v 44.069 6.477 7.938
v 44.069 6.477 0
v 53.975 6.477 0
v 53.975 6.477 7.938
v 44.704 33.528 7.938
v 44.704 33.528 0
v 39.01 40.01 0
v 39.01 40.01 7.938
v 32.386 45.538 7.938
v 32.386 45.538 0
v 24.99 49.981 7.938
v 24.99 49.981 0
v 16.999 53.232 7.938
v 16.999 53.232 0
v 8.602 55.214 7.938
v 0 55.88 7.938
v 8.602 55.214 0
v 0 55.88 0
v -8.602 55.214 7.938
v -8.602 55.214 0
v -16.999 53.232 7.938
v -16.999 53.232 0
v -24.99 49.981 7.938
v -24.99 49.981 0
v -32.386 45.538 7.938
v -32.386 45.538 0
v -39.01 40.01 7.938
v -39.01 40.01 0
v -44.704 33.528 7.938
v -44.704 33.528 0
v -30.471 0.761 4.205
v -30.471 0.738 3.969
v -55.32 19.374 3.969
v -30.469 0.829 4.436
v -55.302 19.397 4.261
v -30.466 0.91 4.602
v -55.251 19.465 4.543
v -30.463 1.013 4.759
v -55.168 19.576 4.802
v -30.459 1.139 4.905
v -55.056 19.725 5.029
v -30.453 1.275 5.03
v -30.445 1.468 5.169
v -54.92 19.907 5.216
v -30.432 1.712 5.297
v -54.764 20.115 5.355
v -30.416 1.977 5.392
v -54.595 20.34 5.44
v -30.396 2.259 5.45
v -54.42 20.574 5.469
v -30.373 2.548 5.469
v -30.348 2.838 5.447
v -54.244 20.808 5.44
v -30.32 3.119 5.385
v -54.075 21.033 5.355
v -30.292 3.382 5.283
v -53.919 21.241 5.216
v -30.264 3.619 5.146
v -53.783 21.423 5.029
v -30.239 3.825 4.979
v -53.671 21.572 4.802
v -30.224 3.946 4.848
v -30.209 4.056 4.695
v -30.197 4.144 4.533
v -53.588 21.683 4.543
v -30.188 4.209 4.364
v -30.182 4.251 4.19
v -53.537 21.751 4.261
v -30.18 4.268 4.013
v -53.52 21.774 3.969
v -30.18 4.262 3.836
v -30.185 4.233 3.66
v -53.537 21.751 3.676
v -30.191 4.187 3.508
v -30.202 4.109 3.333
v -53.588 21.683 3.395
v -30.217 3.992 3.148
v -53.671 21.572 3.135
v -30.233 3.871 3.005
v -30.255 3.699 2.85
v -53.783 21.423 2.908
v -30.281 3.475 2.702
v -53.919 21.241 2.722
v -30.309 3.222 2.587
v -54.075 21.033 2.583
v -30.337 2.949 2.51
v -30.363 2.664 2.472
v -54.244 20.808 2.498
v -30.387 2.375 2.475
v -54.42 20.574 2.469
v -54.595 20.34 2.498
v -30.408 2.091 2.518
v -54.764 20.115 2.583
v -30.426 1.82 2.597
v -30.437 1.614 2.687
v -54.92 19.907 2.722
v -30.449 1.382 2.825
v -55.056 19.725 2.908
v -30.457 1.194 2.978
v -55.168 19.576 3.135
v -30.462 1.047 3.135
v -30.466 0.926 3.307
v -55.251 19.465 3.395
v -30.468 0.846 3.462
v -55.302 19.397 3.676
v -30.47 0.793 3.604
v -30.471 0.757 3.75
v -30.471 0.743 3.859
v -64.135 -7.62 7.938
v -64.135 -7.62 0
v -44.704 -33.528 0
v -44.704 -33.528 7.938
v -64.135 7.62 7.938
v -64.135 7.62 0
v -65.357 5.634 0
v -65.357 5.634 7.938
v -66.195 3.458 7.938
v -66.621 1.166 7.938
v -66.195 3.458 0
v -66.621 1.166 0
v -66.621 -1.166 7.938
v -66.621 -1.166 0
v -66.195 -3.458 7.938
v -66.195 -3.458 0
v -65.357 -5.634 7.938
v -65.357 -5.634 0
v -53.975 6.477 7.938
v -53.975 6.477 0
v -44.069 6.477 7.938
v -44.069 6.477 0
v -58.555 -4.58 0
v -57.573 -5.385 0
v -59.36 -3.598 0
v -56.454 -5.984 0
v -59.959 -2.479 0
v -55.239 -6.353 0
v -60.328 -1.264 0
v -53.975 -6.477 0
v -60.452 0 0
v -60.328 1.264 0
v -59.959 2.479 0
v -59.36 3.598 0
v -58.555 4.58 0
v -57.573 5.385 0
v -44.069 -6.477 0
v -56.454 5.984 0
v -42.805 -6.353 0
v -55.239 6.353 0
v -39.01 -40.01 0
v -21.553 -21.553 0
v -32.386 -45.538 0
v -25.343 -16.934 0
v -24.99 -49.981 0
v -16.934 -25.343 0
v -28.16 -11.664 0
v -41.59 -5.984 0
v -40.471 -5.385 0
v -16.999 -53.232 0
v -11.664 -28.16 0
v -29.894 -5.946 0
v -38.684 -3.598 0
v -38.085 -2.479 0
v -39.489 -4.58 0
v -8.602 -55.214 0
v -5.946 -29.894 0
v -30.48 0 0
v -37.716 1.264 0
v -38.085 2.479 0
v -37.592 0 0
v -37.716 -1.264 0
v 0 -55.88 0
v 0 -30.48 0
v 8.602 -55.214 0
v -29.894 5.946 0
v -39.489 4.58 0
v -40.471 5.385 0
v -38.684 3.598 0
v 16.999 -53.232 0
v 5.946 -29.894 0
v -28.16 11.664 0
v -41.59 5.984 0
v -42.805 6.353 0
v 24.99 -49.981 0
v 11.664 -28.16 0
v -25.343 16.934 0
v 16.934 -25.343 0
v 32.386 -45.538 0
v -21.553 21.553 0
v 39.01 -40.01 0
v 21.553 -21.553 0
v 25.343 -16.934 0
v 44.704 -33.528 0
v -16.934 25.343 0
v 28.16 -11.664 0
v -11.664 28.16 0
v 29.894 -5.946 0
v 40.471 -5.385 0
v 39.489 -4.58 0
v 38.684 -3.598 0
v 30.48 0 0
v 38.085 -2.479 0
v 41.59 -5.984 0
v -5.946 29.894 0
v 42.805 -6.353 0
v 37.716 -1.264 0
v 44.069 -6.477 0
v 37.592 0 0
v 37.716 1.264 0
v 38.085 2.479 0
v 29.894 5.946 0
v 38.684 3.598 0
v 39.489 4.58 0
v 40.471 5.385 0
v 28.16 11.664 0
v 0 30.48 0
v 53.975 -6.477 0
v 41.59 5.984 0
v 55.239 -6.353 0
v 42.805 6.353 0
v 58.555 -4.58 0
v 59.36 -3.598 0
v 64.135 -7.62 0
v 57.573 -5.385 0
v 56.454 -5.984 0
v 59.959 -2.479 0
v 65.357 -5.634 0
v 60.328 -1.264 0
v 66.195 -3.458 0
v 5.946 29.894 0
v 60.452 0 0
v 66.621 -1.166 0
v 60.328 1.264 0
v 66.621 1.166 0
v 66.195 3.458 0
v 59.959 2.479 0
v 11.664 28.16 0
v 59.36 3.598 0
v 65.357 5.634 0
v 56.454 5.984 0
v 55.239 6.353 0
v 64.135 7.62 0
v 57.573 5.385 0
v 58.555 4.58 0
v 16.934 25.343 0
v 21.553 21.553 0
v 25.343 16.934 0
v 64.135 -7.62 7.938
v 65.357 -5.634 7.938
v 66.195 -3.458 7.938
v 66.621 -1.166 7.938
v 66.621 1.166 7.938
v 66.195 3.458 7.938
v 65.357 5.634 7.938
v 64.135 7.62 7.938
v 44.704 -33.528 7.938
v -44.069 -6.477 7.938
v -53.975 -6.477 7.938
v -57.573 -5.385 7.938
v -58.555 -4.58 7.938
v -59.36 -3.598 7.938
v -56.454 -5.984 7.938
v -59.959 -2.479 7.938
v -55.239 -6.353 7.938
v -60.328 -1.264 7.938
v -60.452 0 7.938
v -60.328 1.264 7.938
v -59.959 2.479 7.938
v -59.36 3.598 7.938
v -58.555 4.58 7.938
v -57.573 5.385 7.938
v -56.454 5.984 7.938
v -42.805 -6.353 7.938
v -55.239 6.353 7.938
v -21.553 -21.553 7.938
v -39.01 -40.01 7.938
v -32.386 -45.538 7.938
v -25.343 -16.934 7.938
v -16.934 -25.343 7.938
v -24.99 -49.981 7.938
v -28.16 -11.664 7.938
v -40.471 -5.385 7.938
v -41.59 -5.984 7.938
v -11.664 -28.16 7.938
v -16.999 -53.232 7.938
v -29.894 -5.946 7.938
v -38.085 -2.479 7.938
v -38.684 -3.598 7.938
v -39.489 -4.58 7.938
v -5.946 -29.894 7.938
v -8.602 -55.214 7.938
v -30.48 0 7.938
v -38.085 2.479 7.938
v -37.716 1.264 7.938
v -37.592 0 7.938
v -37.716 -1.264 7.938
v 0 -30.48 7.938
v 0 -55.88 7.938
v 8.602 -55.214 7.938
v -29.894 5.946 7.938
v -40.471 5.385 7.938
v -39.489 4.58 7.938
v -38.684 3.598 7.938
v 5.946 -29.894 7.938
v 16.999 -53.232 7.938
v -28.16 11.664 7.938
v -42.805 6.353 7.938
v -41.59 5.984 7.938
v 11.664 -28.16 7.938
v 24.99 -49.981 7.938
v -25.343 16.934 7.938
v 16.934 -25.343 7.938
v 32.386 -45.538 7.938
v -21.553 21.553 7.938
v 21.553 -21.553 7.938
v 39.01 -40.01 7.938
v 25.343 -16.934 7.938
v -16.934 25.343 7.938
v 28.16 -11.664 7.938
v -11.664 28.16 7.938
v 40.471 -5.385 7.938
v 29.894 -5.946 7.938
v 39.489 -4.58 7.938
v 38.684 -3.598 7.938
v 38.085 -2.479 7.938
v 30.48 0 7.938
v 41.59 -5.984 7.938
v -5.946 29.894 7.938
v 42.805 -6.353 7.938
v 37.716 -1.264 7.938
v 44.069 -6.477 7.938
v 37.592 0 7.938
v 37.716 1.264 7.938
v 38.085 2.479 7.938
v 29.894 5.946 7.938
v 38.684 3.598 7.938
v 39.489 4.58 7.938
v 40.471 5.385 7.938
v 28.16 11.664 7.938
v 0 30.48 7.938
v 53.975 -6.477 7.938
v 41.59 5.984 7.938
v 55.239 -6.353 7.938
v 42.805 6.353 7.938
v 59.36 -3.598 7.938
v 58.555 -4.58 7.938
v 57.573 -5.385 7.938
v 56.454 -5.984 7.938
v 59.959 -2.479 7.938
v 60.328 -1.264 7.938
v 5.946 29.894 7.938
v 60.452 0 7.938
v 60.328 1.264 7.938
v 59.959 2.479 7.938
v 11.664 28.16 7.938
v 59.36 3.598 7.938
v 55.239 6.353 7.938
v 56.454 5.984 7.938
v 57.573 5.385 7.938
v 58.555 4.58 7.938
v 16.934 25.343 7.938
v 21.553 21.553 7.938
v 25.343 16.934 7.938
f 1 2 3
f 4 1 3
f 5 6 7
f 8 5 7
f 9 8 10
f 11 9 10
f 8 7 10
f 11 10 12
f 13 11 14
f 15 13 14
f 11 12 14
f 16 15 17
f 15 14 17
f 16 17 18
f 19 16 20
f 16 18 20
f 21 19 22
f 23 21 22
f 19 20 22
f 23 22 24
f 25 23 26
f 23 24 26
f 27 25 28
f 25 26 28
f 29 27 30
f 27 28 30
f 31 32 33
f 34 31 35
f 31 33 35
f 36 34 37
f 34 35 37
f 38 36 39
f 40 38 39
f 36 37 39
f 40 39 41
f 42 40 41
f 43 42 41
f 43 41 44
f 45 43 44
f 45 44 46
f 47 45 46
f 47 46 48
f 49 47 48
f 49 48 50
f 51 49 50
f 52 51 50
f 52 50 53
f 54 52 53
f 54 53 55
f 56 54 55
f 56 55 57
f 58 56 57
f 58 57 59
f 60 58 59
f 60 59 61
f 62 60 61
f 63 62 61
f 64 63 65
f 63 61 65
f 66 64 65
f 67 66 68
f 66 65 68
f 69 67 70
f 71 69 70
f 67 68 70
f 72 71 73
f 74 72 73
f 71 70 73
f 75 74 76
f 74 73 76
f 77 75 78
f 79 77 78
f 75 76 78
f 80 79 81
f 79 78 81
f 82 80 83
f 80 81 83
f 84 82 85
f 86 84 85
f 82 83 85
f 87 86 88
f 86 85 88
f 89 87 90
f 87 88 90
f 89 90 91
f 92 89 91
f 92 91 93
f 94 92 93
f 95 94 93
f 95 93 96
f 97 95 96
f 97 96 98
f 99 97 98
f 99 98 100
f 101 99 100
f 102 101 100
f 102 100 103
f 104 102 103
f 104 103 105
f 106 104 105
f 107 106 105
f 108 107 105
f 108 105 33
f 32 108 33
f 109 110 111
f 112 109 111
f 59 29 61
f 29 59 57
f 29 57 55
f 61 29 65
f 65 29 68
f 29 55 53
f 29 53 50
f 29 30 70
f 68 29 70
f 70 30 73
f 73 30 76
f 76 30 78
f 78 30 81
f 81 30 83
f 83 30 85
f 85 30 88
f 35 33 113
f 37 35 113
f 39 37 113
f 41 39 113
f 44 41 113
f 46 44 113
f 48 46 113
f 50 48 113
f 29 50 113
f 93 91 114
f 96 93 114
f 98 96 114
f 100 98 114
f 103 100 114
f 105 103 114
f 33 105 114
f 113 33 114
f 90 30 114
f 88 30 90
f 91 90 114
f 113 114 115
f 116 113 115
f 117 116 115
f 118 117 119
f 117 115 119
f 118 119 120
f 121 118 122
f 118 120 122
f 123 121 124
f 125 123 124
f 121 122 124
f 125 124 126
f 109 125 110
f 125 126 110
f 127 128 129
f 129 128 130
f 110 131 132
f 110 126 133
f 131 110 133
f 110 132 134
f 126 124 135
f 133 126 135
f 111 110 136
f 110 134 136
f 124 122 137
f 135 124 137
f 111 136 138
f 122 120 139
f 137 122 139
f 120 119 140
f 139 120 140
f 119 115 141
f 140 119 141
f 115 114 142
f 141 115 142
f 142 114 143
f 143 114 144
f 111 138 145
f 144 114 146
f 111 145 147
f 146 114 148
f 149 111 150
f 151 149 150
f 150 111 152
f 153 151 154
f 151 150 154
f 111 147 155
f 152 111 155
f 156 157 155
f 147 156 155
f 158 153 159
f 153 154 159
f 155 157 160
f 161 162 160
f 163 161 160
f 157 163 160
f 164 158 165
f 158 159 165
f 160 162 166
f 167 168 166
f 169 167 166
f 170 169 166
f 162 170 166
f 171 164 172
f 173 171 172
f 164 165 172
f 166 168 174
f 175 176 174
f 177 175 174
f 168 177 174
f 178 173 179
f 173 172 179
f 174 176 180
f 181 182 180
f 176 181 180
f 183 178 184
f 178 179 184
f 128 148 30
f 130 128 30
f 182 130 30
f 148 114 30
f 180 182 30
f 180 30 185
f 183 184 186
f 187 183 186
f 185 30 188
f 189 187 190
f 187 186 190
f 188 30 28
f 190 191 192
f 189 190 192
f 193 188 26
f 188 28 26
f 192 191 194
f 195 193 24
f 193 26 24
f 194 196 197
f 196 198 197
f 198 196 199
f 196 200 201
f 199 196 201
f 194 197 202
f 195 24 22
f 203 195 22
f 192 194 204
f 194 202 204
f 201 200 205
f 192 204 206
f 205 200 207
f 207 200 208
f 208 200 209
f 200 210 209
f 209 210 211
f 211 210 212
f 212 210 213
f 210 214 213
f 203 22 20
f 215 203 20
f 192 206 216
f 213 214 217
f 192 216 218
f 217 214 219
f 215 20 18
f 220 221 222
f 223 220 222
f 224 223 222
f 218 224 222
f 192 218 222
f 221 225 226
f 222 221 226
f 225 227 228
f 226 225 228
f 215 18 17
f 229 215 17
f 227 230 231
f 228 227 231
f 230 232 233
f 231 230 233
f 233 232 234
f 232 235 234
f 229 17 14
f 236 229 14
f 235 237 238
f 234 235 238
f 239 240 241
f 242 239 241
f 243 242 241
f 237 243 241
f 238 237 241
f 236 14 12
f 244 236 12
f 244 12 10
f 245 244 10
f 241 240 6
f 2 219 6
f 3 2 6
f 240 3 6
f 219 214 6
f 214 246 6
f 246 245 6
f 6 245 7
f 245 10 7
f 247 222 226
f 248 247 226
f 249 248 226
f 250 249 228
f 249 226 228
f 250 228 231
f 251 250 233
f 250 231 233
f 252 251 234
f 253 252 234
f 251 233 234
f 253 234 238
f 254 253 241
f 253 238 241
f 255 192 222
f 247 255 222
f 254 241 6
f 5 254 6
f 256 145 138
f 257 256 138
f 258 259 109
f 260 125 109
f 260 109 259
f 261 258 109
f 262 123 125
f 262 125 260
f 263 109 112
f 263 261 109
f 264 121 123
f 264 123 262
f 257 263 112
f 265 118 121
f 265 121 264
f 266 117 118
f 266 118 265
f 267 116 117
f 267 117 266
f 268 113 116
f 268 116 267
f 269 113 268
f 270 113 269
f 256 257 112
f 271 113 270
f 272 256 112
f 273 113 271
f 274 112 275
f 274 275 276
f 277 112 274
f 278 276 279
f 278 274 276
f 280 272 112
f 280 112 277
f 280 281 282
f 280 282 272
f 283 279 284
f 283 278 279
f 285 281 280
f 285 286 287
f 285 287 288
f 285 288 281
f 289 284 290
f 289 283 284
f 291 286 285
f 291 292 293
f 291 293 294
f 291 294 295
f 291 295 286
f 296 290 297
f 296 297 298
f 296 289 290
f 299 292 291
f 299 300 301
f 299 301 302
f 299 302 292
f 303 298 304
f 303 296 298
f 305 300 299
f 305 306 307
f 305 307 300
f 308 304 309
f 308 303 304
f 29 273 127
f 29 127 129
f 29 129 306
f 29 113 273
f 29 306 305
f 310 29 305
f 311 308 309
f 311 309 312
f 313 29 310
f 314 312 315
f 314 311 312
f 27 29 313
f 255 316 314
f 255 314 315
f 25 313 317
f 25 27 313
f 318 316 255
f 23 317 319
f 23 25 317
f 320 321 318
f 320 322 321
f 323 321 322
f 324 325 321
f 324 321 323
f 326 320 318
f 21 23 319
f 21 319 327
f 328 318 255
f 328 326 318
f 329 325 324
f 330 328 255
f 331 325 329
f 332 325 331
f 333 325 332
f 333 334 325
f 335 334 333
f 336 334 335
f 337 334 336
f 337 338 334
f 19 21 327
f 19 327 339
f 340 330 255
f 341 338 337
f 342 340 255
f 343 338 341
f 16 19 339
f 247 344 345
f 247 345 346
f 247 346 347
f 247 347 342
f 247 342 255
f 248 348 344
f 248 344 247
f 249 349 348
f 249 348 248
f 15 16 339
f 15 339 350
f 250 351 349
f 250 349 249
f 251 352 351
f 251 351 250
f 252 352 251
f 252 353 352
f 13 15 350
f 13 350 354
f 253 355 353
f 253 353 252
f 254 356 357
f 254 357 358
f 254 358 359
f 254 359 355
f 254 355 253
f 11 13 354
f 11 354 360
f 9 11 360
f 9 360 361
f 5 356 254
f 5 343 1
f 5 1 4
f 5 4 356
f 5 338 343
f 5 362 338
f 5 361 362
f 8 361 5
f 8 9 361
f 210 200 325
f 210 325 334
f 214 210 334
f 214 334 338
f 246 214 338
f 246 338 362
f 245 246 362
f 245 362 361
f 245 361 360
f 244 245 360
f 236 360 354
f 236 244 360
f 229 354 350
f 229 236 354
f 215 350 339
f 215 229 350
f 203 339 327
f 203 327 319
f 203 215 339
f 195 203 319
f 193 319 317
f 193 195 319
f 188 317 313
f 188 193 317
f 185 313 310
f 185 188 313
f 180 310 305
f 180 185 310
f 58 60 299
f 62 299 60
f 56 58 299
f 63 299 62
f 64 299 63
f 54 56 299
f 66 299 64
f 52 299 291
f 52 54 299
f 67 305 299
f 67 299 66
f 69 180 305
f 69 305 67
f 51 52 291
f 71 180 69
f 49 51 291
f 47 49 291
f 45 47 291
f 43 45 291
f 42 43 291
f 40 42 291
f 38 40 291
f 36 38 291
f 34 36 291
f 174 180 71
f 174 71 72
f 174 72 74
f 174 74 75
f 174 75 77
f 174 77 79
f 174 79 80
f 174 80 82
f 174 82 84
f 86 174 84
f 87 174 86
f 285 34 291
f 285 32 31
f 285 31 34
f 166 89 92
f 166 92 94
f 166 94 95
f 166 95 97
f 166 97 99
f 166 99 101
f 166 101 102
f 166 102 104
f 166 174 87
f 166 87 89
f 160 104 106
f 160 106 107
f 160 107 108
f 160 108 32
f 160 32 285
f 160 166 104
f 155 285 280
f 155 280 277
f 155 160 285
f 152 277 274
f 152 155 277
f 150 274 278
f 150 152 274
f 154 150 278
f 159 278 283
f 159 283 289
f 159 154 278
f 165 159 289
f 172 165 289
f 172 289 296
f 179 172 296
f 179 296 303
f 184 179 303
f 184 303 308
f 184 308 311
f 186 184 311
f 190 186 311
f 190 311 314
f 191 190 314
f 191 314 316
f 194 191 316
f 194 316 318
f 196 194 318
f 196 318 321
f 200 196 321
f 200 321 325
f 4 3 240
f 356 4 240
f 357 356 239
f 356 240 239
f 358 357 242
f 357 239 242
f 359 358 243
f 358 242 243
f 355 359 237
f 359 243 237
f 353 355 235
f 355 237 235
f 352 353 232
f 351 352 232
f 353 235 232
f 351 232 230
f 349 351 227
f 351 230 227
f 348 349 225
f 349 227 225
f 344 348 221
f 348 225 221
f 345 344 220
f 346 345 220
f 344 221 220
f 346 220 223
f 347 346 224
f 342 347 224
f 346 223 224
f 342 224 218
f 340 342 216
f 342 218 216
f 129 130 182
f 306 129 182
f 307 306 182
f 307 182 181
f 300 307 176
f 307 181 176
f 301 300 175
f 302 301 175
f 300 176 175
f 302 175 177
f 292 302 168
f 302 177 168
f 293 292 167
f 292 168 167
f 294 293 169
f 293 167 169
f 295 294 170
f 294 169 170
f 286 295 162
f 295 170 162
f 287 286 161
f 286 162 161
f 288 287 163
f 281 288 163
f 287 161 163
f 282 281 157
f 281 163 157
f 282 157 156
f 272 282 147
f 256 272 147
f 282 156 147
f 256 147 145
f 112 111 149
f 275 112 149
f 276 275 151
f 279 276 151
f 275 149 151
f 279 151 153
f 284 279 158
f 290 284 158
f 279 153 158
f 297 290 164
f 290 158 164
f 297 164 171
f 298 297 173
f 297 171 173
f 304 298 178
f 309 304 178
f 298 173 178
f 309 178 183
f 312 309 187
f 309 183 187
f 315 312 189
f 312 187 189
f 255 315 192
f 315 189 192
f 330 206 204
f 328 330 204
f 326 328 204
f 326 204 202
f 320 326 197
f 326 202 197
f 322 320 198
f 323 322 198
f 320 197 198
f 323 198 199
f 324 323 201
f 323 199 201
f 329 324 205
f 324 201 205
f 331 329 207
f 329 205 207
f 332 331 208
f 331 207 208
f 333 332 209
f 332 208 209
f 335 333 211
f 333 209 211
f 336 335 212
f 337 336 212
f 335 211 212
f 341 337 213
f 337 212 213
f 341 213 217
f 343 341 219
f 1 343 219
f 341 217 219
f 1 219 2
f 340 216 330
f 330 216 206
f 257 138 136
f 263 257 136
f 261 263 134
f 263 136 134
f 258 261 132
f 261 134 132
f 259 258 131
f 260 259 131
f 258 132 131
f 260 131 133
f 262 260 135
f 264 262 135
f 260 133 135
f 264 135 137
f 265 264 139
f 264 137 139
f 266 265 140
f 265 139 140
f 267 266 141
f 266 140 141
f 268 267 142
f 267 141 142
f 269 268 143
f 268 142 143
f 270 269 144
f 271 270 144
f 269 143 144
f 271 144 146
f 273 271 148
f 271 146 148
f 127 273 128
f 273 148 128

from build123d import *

# Parameters (mm, degrees)
F0_R     = 30.48
F1_DEPTH = 7.9375
F2_R     = 1.5
F3_DEPTH = 32.0605350826


# Not quite as in the source:
# - a length typed as a fraction of an inch, garbled in the dataset ("3 / 203.2 mm" for 3/8 in), is restored


with BuildPart() as f1:
    # F0 (on Top) → F1 (new body)
    with BuildSketch(Plane.XY):
        with BuildLine():
            Line((-64.135, -7.62), (-44.704, -33.528))
            ThreePointArc((-44.704, -33.528), (0, -55.88), (44.704, -33.528))
            Line((44.704, -33.528), (64.135, -7.62))
            ThreePointArc((64.135, -7.62), (66.675, 0), (64.135, 7.62))
            Line((64.135, 7.62), (44.704, 33.528))
            ThreePointArc((44.704, 33.528), (0, 55.88), (-44.704, 33.528))
            Line((-44.704, 33.528), (-64.135, 7.62))
            ThreePointArc((-64.135, 7.62), (-66.675, 0), (-64.135, -7.62))
        make_face()
        with BuildLine():
            ThreePointArc((-53.975, -6.477), (-60.452, 0), (-53.975, 6.477))
            Line((-53.975, 6.477), (-44.069, 6.477))
            ThreePointArc((-44.069, 6.477), (-37.592, 0), (-44.069, -6.477))
            Line((-44.069, -6.477), (-53.975, -6.477))
        make_face(mode=Mode.SUBTRACT)
        Circle(F0_R, mode=Mode.SUBTRACT)
        with BuildLine():
            ThreePointArc((44.069, -6.477), (37.592, 0), (44.069, 6.477))
            Line((44.069, 6.477), (53.9750001618, 6.477))
            ThreePointArc((53.9750001618, 6.477), (60.452, -8.09e-08), (53.975, -6.477))
            Line((53.975, -6.477), (44.069, -6.477))
        make_face(mode=Mode.SUBTRACT)
    extrude(amount=F1_DEPTH)

    # F2 (on face) → F3 (cut, up to face)
    with BuildSketch(Plane(origin=(-44.704, 33.528, 0), x_dir=(-0.6, -0.8, 0), z_dir=(-0.8, 0.6, 0))):
        with Locations((16.1925, 3.96875)):
            Circle(F2_R)
    extrude(amount=-F3_DEPTH, mode=Mode.SUBTRACT)


solid = f1.part
